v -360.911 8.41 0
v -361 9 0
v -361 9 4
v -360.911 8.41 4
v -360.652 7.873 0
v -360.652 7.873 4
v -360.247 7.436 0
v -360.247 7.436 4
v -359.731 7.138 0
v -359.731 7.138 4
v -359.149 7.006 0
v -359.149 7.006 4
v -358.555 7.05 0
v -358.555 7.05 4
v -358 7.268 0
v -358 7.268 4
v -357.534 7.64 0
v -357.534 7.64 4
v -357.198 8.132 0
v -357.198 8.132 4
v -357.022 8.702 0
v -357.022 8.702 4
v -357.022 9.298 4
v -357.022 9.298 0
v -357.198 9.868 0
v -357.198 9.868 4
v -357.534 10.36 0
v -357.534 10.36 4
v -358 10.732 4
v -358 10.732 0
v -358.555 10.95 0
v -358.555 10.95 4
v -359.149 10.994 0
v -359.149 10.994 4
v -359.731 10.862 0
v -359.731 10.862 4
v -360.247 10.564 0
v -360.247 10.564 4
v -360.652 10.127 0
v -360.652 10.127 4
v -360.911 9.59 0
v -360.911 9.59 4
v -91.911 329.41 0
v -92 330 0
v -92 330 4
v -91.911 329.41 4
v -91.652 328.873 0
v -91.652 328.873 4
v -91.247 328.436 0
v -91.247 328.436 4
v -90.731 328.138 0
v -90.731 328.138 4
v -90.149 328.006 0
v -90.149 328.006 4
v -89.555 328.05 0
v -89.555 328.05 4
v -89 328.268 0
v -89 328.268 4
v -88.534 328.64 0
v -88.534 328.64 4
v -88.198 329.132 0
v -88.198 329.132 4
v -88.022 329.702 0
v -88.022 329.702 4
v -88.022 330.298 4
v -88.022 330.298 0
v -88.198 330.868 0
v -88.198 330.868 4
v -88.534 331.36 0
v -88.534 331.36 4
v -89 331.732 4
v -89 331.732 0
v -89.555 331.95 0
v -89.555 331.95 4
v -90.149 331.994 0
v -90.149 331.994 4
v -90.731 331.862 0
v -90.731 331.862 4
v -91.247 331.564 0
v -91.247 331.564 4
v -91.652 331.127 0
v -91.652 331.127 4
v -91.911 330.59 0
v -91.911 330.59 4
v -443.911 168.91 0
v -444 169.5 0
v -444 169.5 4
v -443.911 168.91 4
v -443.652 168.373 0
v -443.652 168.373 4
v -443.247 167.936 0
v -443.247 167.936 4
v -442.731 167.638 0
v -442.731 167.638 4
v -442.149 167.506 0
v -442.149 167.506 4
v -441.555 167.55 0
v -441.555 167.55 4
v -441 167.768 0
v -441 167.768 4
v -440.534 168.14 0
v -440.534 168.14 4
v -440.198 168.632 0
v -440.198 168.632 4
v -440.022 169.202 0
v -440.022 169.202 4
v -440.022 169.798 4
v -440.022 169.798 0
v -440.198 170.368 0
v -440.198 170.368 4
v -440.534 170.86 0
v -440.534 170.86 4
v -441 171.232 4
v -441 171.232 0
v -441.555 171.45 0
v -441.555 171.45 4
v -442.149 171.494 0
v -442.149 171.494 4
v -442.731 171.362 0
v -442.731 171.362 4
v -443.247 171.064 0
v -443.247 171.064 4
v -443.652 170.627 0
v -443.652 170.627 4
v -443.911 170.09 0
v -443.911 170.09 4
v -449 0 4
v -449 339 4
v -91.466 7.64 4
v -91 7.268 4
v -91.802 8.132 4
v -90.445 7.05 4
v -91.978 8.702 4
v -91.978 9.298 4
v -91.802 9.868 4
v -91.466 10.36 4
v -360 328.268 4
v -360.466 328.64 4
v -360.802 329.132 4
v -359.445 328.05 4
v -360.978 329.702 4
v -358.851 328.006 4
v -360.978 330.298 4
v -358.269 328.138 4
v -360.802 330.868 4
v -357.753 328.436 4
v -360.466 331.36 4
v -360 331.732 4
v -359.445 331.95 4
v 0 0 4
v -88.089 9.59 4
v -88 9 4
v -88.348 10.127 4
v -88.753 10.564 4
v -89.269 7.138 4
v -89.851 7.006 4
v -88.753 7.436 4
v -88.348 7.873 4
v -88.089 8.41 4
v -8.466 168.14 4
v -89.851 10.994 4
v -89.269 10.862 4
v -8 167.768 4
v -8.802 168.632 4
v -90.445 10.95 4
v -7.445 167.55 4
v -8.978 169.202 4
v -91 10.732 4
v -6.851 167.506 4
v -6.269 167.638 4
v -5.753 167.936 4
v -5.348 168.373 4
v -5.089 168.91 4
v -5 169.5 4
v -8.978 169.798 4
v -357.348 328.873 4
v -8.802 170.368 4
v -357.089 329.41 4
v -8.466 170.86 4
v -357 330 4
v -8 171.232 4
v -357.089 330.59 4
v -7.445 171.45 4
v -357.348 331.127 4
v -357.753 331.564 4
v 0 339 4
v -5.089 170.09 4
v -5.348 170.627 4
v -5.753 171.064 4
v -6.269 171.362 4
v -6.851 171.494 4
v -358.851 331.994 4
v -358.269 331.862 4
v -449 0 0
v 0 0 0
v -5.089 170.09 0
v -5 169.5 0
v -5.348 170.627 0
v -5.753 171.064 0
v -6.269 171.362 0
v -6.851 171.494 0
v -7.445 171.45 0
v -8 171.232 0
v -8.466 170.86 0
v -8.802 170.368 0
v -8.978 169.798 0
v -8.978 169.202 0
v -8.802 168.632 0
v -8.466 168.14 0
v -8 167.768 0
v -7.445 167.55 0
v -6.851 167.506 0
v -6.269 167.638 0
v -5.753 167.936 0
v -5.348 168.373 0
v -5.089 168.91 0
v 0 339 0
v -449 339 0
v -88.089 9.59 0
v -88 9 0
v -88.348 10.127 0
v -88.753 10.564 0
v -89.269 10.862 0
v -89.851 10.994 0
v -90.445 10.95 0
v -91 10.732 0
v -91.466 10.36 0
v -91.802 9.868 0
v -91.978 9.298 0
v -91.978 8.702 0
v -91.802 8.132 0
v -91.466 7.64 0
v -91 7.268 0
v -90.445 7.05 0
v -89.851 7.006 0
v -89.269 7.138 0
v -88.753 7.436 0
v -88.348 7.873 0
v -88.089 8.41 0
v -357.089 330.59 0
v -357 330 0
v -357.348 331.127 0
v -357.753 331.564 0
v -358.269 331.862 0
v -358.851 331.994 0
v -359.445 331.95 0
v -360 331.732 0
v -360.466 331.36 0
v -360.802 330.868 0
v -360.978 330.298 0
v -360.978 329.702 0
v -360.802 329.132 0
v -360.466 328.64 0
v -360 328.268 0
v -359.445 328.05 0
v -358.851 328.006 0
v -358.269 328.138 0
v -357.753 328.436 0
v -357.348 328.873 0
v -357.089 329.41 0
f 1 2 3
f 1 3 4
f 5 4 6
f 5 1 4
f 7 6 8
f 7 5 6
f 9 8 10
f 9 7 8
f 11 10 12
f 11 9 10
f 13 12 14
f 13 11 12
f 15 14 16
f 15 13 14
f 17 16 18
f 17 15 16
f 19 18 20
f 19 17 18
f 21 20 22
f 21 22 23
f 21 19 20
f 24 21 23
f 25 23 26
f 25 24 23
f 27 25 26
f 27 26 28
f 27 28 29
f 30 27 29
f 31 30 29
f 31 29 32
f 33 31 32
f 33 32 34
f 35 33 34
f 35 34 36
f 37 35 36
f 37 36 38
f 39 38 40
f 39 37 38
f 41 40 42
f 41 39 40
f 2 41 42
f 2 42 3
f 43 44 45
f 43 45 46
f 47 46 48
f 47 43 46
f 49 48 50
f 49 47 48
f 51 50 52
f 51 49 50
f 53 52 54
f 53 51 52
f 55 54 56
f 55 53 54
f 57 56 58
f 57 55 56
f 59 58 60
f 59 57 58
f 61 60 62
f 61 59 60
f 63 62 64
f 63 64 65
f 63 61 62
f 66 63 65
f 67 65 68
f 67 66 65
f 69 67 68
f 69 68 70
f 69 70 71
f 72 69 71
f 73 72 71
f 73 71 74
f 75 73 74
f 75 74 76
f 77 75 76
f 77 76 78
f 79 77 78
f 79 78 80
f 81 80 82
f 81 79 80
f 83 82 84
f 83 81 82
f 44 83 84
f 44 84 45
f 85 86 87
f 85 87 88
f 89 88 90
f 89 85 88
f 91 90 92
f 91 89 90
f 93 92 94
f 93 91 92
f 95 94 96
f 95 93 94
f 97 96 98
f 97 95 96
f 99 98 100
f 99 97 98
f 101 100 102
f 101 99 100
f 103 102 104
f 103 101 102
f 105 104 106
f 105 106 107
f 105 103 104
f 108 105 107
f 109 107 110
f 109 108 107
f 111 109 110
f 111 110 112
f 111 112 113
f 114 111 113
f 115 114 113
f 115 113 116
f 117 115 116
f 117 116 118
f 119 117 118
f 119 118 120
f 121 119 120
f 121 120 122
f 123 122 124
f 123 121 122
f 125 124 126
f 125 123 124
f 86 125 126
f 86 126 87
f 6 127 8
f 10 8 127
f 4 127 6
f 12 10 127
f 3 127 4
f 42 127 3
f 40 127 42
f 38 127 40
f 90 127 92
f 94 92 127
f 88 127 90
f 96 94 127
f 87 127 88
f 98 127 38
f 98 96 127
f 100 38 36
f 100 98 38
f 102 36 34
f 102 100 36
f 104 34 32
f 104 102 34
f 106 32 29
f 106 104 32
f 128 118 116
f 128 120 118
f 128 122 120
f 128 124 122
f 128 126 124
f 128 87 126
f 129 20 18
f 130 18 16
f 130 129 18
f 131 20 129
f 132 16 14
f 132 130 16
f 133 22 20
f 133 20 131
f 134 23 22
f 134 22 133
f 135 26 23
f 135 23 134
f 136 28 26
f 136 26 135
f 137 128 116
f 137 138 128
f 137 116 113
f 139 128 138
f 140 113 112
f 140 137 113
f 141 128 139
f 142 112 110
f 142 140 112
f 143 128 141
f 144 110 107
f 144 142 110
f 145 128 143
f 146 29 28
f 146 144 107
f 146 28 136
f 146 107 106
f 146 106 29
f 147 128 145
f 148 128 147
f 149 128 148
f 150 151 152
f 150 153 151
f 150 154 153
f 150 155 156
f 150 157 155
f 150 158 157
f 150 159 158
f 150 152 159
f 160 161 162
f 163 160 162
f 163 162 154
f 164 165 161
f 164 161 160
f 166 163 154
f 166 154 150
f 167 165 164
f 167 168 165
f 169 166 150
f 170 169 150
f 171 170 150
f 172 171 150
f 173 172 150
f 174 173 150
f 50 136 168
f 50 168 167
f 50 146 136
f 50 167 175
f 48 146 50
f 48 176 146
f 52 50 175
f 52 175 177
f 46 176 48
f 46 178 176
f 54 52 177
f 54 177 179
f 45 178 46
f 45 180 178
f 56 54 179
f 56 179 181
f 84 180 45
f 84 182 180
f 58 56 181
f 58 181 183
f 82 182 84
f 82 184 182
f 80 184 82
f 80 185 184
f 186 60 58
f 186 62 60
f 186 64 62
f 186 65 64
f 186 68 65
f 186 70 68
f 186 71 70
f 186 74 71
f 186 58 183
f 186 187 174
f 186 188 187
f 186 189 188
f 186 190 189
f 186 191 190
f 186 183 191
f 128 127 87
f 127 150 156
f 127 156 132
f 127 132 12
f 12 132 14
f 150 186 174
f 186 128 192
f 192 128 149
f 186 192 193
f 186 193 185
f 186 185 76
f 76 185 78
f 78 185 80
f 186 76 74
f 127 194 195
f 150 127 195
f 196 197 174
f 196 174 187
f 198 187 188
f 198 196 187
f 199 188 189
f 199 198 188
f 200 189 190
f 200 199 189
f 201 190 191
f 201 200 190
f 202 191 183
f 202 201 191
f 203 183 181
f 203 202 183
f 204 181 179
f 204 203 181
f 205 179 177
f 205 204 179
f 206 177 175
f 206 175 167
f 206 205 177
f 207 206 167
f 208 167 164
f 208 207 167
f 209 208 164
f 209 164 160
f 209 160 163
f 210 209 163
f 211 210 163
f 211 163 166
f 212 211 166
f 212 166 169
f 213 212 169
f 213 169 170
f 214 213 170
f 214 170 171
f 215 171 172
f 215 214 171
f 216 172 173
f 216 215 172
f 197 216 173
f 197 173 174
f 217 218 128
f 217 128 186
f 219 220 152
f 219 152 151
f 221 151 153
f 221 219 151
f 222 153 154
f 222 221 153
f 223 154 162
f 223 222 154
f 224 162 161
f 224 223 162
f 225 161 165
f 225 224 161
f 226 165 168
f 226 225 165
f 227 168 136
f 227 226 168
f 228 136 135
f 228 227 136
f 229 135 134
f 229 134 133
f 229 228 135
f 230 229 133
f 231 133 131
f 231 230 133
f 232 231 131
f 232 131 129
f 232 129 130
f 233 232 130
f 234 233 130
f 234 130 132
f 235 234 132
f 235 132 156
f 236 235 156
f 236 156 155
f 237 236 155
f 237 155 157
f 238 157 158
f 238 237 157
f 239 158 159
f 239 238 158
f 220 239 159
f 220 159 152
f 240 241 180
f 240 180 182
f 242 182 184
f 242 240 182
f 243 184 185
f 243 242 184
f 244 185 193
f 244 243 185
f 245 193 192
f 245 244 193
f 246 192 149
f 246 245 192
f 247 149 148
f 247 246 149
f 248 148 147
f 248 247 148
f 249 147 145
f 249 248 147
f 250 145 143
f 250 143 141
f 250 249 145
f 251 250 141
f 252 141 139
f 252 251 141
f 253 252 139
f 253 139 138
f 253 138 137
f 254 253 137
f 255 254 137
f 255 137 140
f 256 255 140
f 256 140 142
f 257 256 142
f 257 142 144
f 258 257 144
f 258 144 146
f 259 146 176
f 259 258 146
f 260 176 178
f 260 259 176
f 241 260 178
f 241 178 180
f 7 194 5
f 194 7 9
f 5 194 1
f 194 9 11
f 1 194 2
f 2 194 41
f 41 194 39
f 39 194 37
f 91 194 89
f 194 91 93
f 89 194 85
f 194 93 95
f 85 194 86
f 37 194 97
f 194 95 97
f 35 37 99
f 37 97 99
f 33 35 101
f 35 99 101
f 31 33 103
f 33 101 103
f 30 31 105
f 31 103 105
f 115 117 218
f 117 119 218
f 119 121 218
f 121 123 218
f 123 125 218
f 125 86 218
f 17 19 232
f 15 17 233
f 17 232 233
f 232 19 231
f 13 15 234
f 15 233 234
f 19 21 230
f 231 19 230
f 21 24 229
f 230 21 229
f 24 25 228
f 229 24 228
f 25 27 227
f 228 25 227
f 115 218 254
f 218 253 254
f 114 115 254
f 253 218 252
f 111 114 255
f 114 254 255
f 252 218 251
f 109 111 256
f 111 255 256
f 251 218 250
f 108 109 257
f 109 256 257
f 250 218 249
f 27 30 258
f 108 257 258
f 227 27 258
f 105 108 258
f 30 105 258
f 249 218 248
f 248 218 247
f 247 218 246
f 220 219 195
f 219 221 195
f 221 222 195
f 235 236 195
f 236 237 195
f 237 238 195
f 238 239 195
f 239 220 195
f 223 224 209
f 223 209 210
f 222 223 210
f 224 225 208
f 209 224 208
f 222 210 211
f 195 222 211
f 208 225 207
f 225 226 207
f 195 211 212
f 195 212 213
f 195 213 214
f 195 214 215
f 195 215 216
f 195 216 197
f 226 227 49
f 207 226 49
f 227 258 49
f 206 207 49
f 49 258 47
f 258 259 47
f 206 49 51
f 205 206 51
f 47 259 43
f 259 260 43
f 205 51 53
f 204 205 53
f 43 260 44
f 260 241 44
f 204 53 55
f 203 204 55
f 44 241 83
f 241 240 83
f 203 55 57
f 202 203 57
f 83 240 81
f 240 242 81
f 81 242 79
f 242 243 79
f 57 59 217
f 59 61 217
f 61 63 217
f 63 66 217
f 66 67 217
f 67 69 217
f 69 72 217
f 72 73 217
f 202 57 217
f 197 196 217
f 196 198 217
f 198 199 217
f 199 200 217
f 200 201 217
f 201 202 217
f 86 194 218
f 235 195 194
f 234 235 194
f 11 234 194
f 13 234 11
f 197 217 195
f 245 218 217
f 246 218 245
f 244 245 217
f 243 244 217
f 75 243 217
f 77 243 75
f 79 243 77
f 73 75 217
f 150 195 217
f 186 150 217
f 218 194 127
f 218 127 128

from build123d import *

# Parameters (mm, degrees)
SCHIZZO1_W                   = 449
SCHIZZO1_H                   = 339
SCHIZZO1_R                   = 2
ESTRUSIONE_ESTRUSIONE1_DEPTH = 4


with BuildPart() as part:
    # Schizzo1 → Estrusione-Estrusione1 (new body)
    with BuildSketch(Plane.XY):
        with Locations((-224.5, 169.5)):
            Rectangle(SCHIZZO1_W, SCHIZZO1_H)
        with Locations(Location((-90, 330, 0), (0, 0, 180))):
            Circle(SCHIZZO1_R, mode=Mode.SUBTRACT)
        with Locations((-7, 169.5)):
            Circle(SCHIZZO1_R, mode=Mode.SUBTRACT)
        with Locations((-359, 330)):
            Circle(SCHIZZO1_R, mode=Mode.SUBTRACT)
        with Locations(Location((-442, 169.5, 0), (0, 0, 180))):
            Circle(SCHIZZO1_R, mode=Mode.SUBTRACT)
        with Locations(Location((-359, 9, 0), (0, 0, 180))):
            Circle(SCHIZZO1_R, mode=Mode.SUBTRACT)
        with Locations((-90, 9)):
            Circle(SCHIZZO1_R, mode=Mode.SUBTRACT)
    extrude(amount=ESTRUSIONE_ESTRUSIONE1_DEPTH)


solid = part.part
